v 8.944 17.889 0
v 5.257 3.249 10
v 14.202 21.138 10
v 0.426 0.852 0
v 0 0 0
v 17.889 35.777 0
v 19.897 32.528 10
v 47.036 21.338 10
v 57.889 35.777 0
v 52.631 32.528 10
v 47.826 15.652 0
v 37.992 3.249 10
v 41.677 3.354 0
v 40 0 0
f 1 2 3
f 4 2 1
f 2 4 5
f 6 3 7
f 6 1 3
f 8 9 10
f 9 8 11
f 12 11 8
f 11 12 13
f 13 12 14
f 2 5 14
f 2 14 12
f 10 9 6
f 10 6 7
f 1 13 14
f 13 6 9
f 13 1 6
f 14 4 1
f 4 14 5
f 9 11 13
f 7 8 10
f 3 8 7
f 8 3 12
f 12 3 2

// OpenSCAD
/*
	Rhombic Triacontahedron with magnets tile, by eshira
	Dihedral angle: 144°
	Rhombic angles: 
	
	30 tiles total are required.
	Use axially aligned magnets (4 per tile).
	Magnet mounting per tile MUST BE IDENTICAL!
	Following the following constraints:
		-Two parallel sides have the same pole facing outward
		-Two adjacent sides have the opposite pole facing outward
    See the diagram included for more help.

*/

$fn=50;

//User Defined Variables
side = 40; //side length (all sides are equal length)
thickness = 10; //how thick (z dimension) the tile is
magnetdepth = 2.5; //depth of the magnet holes; tailor this to suit your 3d printer
magnetdiam = 6.5; //diameter of the magnet holes; tailor this to suit your 3d printer

//Other Variables
dihedral = 144; //the dihedral angle

alpha = atan(2); //Rhombus acute angle
beta = 360-alpha*2;

difference(){
	mainbody();
    union() {
        chamfers();
        //magnets();
    }
}

//Modules

module mainbody(){
	linear_extrude(height = thickness ) {
		polygon([[0,0],[side,0],[side+side*cos(alpha),side*sin(alpha)],[side*cos(alpha),side*sin(alpha)]]);
	}
}

module chamfers() {
	rotate([(180-dihedral)/2,0,alpha]){
		linear_extrude(center=true, height=thickness*10) {
			polygon([[-5,0],[-5,thickness],[side+5,thickness],[side+5,0]]);
		}
	}

	translate([side,0,0]){
		rotate([(-180+dihedral)/2,0,alpha]){
			translate([0,-thickness,0]){
				linear_extrude(center=true, height=thickness*10) {
					polygon([[-5,0],[-5,thickness],[side,thickness],[side,0]]);
				}
			}
		}
	}
    
	rotate([(-180+dihedral)/2,0,0]){
		translate([0,-thickness,0]){
			linear_extrude(center=true, height=thickness*10) {
				polygon([[-5,0],[-5,thickness],[side,thickness],[side,0]]);
			}
		}
	}
    translate([side*cos(alpha),side*sin(alpha),0]){
        mirror([0,1,0]){
            rotate([(-180+dihedral)/2,0,0]){
                translate([0,-thickness,0]){
                    linear_extrude(center=true, height=thickness*10) {
                        polygon([[-5,0],[-5,thickness],[side,thickness],[side,0]]);
                    }
                }
			}
		}
	}
}
